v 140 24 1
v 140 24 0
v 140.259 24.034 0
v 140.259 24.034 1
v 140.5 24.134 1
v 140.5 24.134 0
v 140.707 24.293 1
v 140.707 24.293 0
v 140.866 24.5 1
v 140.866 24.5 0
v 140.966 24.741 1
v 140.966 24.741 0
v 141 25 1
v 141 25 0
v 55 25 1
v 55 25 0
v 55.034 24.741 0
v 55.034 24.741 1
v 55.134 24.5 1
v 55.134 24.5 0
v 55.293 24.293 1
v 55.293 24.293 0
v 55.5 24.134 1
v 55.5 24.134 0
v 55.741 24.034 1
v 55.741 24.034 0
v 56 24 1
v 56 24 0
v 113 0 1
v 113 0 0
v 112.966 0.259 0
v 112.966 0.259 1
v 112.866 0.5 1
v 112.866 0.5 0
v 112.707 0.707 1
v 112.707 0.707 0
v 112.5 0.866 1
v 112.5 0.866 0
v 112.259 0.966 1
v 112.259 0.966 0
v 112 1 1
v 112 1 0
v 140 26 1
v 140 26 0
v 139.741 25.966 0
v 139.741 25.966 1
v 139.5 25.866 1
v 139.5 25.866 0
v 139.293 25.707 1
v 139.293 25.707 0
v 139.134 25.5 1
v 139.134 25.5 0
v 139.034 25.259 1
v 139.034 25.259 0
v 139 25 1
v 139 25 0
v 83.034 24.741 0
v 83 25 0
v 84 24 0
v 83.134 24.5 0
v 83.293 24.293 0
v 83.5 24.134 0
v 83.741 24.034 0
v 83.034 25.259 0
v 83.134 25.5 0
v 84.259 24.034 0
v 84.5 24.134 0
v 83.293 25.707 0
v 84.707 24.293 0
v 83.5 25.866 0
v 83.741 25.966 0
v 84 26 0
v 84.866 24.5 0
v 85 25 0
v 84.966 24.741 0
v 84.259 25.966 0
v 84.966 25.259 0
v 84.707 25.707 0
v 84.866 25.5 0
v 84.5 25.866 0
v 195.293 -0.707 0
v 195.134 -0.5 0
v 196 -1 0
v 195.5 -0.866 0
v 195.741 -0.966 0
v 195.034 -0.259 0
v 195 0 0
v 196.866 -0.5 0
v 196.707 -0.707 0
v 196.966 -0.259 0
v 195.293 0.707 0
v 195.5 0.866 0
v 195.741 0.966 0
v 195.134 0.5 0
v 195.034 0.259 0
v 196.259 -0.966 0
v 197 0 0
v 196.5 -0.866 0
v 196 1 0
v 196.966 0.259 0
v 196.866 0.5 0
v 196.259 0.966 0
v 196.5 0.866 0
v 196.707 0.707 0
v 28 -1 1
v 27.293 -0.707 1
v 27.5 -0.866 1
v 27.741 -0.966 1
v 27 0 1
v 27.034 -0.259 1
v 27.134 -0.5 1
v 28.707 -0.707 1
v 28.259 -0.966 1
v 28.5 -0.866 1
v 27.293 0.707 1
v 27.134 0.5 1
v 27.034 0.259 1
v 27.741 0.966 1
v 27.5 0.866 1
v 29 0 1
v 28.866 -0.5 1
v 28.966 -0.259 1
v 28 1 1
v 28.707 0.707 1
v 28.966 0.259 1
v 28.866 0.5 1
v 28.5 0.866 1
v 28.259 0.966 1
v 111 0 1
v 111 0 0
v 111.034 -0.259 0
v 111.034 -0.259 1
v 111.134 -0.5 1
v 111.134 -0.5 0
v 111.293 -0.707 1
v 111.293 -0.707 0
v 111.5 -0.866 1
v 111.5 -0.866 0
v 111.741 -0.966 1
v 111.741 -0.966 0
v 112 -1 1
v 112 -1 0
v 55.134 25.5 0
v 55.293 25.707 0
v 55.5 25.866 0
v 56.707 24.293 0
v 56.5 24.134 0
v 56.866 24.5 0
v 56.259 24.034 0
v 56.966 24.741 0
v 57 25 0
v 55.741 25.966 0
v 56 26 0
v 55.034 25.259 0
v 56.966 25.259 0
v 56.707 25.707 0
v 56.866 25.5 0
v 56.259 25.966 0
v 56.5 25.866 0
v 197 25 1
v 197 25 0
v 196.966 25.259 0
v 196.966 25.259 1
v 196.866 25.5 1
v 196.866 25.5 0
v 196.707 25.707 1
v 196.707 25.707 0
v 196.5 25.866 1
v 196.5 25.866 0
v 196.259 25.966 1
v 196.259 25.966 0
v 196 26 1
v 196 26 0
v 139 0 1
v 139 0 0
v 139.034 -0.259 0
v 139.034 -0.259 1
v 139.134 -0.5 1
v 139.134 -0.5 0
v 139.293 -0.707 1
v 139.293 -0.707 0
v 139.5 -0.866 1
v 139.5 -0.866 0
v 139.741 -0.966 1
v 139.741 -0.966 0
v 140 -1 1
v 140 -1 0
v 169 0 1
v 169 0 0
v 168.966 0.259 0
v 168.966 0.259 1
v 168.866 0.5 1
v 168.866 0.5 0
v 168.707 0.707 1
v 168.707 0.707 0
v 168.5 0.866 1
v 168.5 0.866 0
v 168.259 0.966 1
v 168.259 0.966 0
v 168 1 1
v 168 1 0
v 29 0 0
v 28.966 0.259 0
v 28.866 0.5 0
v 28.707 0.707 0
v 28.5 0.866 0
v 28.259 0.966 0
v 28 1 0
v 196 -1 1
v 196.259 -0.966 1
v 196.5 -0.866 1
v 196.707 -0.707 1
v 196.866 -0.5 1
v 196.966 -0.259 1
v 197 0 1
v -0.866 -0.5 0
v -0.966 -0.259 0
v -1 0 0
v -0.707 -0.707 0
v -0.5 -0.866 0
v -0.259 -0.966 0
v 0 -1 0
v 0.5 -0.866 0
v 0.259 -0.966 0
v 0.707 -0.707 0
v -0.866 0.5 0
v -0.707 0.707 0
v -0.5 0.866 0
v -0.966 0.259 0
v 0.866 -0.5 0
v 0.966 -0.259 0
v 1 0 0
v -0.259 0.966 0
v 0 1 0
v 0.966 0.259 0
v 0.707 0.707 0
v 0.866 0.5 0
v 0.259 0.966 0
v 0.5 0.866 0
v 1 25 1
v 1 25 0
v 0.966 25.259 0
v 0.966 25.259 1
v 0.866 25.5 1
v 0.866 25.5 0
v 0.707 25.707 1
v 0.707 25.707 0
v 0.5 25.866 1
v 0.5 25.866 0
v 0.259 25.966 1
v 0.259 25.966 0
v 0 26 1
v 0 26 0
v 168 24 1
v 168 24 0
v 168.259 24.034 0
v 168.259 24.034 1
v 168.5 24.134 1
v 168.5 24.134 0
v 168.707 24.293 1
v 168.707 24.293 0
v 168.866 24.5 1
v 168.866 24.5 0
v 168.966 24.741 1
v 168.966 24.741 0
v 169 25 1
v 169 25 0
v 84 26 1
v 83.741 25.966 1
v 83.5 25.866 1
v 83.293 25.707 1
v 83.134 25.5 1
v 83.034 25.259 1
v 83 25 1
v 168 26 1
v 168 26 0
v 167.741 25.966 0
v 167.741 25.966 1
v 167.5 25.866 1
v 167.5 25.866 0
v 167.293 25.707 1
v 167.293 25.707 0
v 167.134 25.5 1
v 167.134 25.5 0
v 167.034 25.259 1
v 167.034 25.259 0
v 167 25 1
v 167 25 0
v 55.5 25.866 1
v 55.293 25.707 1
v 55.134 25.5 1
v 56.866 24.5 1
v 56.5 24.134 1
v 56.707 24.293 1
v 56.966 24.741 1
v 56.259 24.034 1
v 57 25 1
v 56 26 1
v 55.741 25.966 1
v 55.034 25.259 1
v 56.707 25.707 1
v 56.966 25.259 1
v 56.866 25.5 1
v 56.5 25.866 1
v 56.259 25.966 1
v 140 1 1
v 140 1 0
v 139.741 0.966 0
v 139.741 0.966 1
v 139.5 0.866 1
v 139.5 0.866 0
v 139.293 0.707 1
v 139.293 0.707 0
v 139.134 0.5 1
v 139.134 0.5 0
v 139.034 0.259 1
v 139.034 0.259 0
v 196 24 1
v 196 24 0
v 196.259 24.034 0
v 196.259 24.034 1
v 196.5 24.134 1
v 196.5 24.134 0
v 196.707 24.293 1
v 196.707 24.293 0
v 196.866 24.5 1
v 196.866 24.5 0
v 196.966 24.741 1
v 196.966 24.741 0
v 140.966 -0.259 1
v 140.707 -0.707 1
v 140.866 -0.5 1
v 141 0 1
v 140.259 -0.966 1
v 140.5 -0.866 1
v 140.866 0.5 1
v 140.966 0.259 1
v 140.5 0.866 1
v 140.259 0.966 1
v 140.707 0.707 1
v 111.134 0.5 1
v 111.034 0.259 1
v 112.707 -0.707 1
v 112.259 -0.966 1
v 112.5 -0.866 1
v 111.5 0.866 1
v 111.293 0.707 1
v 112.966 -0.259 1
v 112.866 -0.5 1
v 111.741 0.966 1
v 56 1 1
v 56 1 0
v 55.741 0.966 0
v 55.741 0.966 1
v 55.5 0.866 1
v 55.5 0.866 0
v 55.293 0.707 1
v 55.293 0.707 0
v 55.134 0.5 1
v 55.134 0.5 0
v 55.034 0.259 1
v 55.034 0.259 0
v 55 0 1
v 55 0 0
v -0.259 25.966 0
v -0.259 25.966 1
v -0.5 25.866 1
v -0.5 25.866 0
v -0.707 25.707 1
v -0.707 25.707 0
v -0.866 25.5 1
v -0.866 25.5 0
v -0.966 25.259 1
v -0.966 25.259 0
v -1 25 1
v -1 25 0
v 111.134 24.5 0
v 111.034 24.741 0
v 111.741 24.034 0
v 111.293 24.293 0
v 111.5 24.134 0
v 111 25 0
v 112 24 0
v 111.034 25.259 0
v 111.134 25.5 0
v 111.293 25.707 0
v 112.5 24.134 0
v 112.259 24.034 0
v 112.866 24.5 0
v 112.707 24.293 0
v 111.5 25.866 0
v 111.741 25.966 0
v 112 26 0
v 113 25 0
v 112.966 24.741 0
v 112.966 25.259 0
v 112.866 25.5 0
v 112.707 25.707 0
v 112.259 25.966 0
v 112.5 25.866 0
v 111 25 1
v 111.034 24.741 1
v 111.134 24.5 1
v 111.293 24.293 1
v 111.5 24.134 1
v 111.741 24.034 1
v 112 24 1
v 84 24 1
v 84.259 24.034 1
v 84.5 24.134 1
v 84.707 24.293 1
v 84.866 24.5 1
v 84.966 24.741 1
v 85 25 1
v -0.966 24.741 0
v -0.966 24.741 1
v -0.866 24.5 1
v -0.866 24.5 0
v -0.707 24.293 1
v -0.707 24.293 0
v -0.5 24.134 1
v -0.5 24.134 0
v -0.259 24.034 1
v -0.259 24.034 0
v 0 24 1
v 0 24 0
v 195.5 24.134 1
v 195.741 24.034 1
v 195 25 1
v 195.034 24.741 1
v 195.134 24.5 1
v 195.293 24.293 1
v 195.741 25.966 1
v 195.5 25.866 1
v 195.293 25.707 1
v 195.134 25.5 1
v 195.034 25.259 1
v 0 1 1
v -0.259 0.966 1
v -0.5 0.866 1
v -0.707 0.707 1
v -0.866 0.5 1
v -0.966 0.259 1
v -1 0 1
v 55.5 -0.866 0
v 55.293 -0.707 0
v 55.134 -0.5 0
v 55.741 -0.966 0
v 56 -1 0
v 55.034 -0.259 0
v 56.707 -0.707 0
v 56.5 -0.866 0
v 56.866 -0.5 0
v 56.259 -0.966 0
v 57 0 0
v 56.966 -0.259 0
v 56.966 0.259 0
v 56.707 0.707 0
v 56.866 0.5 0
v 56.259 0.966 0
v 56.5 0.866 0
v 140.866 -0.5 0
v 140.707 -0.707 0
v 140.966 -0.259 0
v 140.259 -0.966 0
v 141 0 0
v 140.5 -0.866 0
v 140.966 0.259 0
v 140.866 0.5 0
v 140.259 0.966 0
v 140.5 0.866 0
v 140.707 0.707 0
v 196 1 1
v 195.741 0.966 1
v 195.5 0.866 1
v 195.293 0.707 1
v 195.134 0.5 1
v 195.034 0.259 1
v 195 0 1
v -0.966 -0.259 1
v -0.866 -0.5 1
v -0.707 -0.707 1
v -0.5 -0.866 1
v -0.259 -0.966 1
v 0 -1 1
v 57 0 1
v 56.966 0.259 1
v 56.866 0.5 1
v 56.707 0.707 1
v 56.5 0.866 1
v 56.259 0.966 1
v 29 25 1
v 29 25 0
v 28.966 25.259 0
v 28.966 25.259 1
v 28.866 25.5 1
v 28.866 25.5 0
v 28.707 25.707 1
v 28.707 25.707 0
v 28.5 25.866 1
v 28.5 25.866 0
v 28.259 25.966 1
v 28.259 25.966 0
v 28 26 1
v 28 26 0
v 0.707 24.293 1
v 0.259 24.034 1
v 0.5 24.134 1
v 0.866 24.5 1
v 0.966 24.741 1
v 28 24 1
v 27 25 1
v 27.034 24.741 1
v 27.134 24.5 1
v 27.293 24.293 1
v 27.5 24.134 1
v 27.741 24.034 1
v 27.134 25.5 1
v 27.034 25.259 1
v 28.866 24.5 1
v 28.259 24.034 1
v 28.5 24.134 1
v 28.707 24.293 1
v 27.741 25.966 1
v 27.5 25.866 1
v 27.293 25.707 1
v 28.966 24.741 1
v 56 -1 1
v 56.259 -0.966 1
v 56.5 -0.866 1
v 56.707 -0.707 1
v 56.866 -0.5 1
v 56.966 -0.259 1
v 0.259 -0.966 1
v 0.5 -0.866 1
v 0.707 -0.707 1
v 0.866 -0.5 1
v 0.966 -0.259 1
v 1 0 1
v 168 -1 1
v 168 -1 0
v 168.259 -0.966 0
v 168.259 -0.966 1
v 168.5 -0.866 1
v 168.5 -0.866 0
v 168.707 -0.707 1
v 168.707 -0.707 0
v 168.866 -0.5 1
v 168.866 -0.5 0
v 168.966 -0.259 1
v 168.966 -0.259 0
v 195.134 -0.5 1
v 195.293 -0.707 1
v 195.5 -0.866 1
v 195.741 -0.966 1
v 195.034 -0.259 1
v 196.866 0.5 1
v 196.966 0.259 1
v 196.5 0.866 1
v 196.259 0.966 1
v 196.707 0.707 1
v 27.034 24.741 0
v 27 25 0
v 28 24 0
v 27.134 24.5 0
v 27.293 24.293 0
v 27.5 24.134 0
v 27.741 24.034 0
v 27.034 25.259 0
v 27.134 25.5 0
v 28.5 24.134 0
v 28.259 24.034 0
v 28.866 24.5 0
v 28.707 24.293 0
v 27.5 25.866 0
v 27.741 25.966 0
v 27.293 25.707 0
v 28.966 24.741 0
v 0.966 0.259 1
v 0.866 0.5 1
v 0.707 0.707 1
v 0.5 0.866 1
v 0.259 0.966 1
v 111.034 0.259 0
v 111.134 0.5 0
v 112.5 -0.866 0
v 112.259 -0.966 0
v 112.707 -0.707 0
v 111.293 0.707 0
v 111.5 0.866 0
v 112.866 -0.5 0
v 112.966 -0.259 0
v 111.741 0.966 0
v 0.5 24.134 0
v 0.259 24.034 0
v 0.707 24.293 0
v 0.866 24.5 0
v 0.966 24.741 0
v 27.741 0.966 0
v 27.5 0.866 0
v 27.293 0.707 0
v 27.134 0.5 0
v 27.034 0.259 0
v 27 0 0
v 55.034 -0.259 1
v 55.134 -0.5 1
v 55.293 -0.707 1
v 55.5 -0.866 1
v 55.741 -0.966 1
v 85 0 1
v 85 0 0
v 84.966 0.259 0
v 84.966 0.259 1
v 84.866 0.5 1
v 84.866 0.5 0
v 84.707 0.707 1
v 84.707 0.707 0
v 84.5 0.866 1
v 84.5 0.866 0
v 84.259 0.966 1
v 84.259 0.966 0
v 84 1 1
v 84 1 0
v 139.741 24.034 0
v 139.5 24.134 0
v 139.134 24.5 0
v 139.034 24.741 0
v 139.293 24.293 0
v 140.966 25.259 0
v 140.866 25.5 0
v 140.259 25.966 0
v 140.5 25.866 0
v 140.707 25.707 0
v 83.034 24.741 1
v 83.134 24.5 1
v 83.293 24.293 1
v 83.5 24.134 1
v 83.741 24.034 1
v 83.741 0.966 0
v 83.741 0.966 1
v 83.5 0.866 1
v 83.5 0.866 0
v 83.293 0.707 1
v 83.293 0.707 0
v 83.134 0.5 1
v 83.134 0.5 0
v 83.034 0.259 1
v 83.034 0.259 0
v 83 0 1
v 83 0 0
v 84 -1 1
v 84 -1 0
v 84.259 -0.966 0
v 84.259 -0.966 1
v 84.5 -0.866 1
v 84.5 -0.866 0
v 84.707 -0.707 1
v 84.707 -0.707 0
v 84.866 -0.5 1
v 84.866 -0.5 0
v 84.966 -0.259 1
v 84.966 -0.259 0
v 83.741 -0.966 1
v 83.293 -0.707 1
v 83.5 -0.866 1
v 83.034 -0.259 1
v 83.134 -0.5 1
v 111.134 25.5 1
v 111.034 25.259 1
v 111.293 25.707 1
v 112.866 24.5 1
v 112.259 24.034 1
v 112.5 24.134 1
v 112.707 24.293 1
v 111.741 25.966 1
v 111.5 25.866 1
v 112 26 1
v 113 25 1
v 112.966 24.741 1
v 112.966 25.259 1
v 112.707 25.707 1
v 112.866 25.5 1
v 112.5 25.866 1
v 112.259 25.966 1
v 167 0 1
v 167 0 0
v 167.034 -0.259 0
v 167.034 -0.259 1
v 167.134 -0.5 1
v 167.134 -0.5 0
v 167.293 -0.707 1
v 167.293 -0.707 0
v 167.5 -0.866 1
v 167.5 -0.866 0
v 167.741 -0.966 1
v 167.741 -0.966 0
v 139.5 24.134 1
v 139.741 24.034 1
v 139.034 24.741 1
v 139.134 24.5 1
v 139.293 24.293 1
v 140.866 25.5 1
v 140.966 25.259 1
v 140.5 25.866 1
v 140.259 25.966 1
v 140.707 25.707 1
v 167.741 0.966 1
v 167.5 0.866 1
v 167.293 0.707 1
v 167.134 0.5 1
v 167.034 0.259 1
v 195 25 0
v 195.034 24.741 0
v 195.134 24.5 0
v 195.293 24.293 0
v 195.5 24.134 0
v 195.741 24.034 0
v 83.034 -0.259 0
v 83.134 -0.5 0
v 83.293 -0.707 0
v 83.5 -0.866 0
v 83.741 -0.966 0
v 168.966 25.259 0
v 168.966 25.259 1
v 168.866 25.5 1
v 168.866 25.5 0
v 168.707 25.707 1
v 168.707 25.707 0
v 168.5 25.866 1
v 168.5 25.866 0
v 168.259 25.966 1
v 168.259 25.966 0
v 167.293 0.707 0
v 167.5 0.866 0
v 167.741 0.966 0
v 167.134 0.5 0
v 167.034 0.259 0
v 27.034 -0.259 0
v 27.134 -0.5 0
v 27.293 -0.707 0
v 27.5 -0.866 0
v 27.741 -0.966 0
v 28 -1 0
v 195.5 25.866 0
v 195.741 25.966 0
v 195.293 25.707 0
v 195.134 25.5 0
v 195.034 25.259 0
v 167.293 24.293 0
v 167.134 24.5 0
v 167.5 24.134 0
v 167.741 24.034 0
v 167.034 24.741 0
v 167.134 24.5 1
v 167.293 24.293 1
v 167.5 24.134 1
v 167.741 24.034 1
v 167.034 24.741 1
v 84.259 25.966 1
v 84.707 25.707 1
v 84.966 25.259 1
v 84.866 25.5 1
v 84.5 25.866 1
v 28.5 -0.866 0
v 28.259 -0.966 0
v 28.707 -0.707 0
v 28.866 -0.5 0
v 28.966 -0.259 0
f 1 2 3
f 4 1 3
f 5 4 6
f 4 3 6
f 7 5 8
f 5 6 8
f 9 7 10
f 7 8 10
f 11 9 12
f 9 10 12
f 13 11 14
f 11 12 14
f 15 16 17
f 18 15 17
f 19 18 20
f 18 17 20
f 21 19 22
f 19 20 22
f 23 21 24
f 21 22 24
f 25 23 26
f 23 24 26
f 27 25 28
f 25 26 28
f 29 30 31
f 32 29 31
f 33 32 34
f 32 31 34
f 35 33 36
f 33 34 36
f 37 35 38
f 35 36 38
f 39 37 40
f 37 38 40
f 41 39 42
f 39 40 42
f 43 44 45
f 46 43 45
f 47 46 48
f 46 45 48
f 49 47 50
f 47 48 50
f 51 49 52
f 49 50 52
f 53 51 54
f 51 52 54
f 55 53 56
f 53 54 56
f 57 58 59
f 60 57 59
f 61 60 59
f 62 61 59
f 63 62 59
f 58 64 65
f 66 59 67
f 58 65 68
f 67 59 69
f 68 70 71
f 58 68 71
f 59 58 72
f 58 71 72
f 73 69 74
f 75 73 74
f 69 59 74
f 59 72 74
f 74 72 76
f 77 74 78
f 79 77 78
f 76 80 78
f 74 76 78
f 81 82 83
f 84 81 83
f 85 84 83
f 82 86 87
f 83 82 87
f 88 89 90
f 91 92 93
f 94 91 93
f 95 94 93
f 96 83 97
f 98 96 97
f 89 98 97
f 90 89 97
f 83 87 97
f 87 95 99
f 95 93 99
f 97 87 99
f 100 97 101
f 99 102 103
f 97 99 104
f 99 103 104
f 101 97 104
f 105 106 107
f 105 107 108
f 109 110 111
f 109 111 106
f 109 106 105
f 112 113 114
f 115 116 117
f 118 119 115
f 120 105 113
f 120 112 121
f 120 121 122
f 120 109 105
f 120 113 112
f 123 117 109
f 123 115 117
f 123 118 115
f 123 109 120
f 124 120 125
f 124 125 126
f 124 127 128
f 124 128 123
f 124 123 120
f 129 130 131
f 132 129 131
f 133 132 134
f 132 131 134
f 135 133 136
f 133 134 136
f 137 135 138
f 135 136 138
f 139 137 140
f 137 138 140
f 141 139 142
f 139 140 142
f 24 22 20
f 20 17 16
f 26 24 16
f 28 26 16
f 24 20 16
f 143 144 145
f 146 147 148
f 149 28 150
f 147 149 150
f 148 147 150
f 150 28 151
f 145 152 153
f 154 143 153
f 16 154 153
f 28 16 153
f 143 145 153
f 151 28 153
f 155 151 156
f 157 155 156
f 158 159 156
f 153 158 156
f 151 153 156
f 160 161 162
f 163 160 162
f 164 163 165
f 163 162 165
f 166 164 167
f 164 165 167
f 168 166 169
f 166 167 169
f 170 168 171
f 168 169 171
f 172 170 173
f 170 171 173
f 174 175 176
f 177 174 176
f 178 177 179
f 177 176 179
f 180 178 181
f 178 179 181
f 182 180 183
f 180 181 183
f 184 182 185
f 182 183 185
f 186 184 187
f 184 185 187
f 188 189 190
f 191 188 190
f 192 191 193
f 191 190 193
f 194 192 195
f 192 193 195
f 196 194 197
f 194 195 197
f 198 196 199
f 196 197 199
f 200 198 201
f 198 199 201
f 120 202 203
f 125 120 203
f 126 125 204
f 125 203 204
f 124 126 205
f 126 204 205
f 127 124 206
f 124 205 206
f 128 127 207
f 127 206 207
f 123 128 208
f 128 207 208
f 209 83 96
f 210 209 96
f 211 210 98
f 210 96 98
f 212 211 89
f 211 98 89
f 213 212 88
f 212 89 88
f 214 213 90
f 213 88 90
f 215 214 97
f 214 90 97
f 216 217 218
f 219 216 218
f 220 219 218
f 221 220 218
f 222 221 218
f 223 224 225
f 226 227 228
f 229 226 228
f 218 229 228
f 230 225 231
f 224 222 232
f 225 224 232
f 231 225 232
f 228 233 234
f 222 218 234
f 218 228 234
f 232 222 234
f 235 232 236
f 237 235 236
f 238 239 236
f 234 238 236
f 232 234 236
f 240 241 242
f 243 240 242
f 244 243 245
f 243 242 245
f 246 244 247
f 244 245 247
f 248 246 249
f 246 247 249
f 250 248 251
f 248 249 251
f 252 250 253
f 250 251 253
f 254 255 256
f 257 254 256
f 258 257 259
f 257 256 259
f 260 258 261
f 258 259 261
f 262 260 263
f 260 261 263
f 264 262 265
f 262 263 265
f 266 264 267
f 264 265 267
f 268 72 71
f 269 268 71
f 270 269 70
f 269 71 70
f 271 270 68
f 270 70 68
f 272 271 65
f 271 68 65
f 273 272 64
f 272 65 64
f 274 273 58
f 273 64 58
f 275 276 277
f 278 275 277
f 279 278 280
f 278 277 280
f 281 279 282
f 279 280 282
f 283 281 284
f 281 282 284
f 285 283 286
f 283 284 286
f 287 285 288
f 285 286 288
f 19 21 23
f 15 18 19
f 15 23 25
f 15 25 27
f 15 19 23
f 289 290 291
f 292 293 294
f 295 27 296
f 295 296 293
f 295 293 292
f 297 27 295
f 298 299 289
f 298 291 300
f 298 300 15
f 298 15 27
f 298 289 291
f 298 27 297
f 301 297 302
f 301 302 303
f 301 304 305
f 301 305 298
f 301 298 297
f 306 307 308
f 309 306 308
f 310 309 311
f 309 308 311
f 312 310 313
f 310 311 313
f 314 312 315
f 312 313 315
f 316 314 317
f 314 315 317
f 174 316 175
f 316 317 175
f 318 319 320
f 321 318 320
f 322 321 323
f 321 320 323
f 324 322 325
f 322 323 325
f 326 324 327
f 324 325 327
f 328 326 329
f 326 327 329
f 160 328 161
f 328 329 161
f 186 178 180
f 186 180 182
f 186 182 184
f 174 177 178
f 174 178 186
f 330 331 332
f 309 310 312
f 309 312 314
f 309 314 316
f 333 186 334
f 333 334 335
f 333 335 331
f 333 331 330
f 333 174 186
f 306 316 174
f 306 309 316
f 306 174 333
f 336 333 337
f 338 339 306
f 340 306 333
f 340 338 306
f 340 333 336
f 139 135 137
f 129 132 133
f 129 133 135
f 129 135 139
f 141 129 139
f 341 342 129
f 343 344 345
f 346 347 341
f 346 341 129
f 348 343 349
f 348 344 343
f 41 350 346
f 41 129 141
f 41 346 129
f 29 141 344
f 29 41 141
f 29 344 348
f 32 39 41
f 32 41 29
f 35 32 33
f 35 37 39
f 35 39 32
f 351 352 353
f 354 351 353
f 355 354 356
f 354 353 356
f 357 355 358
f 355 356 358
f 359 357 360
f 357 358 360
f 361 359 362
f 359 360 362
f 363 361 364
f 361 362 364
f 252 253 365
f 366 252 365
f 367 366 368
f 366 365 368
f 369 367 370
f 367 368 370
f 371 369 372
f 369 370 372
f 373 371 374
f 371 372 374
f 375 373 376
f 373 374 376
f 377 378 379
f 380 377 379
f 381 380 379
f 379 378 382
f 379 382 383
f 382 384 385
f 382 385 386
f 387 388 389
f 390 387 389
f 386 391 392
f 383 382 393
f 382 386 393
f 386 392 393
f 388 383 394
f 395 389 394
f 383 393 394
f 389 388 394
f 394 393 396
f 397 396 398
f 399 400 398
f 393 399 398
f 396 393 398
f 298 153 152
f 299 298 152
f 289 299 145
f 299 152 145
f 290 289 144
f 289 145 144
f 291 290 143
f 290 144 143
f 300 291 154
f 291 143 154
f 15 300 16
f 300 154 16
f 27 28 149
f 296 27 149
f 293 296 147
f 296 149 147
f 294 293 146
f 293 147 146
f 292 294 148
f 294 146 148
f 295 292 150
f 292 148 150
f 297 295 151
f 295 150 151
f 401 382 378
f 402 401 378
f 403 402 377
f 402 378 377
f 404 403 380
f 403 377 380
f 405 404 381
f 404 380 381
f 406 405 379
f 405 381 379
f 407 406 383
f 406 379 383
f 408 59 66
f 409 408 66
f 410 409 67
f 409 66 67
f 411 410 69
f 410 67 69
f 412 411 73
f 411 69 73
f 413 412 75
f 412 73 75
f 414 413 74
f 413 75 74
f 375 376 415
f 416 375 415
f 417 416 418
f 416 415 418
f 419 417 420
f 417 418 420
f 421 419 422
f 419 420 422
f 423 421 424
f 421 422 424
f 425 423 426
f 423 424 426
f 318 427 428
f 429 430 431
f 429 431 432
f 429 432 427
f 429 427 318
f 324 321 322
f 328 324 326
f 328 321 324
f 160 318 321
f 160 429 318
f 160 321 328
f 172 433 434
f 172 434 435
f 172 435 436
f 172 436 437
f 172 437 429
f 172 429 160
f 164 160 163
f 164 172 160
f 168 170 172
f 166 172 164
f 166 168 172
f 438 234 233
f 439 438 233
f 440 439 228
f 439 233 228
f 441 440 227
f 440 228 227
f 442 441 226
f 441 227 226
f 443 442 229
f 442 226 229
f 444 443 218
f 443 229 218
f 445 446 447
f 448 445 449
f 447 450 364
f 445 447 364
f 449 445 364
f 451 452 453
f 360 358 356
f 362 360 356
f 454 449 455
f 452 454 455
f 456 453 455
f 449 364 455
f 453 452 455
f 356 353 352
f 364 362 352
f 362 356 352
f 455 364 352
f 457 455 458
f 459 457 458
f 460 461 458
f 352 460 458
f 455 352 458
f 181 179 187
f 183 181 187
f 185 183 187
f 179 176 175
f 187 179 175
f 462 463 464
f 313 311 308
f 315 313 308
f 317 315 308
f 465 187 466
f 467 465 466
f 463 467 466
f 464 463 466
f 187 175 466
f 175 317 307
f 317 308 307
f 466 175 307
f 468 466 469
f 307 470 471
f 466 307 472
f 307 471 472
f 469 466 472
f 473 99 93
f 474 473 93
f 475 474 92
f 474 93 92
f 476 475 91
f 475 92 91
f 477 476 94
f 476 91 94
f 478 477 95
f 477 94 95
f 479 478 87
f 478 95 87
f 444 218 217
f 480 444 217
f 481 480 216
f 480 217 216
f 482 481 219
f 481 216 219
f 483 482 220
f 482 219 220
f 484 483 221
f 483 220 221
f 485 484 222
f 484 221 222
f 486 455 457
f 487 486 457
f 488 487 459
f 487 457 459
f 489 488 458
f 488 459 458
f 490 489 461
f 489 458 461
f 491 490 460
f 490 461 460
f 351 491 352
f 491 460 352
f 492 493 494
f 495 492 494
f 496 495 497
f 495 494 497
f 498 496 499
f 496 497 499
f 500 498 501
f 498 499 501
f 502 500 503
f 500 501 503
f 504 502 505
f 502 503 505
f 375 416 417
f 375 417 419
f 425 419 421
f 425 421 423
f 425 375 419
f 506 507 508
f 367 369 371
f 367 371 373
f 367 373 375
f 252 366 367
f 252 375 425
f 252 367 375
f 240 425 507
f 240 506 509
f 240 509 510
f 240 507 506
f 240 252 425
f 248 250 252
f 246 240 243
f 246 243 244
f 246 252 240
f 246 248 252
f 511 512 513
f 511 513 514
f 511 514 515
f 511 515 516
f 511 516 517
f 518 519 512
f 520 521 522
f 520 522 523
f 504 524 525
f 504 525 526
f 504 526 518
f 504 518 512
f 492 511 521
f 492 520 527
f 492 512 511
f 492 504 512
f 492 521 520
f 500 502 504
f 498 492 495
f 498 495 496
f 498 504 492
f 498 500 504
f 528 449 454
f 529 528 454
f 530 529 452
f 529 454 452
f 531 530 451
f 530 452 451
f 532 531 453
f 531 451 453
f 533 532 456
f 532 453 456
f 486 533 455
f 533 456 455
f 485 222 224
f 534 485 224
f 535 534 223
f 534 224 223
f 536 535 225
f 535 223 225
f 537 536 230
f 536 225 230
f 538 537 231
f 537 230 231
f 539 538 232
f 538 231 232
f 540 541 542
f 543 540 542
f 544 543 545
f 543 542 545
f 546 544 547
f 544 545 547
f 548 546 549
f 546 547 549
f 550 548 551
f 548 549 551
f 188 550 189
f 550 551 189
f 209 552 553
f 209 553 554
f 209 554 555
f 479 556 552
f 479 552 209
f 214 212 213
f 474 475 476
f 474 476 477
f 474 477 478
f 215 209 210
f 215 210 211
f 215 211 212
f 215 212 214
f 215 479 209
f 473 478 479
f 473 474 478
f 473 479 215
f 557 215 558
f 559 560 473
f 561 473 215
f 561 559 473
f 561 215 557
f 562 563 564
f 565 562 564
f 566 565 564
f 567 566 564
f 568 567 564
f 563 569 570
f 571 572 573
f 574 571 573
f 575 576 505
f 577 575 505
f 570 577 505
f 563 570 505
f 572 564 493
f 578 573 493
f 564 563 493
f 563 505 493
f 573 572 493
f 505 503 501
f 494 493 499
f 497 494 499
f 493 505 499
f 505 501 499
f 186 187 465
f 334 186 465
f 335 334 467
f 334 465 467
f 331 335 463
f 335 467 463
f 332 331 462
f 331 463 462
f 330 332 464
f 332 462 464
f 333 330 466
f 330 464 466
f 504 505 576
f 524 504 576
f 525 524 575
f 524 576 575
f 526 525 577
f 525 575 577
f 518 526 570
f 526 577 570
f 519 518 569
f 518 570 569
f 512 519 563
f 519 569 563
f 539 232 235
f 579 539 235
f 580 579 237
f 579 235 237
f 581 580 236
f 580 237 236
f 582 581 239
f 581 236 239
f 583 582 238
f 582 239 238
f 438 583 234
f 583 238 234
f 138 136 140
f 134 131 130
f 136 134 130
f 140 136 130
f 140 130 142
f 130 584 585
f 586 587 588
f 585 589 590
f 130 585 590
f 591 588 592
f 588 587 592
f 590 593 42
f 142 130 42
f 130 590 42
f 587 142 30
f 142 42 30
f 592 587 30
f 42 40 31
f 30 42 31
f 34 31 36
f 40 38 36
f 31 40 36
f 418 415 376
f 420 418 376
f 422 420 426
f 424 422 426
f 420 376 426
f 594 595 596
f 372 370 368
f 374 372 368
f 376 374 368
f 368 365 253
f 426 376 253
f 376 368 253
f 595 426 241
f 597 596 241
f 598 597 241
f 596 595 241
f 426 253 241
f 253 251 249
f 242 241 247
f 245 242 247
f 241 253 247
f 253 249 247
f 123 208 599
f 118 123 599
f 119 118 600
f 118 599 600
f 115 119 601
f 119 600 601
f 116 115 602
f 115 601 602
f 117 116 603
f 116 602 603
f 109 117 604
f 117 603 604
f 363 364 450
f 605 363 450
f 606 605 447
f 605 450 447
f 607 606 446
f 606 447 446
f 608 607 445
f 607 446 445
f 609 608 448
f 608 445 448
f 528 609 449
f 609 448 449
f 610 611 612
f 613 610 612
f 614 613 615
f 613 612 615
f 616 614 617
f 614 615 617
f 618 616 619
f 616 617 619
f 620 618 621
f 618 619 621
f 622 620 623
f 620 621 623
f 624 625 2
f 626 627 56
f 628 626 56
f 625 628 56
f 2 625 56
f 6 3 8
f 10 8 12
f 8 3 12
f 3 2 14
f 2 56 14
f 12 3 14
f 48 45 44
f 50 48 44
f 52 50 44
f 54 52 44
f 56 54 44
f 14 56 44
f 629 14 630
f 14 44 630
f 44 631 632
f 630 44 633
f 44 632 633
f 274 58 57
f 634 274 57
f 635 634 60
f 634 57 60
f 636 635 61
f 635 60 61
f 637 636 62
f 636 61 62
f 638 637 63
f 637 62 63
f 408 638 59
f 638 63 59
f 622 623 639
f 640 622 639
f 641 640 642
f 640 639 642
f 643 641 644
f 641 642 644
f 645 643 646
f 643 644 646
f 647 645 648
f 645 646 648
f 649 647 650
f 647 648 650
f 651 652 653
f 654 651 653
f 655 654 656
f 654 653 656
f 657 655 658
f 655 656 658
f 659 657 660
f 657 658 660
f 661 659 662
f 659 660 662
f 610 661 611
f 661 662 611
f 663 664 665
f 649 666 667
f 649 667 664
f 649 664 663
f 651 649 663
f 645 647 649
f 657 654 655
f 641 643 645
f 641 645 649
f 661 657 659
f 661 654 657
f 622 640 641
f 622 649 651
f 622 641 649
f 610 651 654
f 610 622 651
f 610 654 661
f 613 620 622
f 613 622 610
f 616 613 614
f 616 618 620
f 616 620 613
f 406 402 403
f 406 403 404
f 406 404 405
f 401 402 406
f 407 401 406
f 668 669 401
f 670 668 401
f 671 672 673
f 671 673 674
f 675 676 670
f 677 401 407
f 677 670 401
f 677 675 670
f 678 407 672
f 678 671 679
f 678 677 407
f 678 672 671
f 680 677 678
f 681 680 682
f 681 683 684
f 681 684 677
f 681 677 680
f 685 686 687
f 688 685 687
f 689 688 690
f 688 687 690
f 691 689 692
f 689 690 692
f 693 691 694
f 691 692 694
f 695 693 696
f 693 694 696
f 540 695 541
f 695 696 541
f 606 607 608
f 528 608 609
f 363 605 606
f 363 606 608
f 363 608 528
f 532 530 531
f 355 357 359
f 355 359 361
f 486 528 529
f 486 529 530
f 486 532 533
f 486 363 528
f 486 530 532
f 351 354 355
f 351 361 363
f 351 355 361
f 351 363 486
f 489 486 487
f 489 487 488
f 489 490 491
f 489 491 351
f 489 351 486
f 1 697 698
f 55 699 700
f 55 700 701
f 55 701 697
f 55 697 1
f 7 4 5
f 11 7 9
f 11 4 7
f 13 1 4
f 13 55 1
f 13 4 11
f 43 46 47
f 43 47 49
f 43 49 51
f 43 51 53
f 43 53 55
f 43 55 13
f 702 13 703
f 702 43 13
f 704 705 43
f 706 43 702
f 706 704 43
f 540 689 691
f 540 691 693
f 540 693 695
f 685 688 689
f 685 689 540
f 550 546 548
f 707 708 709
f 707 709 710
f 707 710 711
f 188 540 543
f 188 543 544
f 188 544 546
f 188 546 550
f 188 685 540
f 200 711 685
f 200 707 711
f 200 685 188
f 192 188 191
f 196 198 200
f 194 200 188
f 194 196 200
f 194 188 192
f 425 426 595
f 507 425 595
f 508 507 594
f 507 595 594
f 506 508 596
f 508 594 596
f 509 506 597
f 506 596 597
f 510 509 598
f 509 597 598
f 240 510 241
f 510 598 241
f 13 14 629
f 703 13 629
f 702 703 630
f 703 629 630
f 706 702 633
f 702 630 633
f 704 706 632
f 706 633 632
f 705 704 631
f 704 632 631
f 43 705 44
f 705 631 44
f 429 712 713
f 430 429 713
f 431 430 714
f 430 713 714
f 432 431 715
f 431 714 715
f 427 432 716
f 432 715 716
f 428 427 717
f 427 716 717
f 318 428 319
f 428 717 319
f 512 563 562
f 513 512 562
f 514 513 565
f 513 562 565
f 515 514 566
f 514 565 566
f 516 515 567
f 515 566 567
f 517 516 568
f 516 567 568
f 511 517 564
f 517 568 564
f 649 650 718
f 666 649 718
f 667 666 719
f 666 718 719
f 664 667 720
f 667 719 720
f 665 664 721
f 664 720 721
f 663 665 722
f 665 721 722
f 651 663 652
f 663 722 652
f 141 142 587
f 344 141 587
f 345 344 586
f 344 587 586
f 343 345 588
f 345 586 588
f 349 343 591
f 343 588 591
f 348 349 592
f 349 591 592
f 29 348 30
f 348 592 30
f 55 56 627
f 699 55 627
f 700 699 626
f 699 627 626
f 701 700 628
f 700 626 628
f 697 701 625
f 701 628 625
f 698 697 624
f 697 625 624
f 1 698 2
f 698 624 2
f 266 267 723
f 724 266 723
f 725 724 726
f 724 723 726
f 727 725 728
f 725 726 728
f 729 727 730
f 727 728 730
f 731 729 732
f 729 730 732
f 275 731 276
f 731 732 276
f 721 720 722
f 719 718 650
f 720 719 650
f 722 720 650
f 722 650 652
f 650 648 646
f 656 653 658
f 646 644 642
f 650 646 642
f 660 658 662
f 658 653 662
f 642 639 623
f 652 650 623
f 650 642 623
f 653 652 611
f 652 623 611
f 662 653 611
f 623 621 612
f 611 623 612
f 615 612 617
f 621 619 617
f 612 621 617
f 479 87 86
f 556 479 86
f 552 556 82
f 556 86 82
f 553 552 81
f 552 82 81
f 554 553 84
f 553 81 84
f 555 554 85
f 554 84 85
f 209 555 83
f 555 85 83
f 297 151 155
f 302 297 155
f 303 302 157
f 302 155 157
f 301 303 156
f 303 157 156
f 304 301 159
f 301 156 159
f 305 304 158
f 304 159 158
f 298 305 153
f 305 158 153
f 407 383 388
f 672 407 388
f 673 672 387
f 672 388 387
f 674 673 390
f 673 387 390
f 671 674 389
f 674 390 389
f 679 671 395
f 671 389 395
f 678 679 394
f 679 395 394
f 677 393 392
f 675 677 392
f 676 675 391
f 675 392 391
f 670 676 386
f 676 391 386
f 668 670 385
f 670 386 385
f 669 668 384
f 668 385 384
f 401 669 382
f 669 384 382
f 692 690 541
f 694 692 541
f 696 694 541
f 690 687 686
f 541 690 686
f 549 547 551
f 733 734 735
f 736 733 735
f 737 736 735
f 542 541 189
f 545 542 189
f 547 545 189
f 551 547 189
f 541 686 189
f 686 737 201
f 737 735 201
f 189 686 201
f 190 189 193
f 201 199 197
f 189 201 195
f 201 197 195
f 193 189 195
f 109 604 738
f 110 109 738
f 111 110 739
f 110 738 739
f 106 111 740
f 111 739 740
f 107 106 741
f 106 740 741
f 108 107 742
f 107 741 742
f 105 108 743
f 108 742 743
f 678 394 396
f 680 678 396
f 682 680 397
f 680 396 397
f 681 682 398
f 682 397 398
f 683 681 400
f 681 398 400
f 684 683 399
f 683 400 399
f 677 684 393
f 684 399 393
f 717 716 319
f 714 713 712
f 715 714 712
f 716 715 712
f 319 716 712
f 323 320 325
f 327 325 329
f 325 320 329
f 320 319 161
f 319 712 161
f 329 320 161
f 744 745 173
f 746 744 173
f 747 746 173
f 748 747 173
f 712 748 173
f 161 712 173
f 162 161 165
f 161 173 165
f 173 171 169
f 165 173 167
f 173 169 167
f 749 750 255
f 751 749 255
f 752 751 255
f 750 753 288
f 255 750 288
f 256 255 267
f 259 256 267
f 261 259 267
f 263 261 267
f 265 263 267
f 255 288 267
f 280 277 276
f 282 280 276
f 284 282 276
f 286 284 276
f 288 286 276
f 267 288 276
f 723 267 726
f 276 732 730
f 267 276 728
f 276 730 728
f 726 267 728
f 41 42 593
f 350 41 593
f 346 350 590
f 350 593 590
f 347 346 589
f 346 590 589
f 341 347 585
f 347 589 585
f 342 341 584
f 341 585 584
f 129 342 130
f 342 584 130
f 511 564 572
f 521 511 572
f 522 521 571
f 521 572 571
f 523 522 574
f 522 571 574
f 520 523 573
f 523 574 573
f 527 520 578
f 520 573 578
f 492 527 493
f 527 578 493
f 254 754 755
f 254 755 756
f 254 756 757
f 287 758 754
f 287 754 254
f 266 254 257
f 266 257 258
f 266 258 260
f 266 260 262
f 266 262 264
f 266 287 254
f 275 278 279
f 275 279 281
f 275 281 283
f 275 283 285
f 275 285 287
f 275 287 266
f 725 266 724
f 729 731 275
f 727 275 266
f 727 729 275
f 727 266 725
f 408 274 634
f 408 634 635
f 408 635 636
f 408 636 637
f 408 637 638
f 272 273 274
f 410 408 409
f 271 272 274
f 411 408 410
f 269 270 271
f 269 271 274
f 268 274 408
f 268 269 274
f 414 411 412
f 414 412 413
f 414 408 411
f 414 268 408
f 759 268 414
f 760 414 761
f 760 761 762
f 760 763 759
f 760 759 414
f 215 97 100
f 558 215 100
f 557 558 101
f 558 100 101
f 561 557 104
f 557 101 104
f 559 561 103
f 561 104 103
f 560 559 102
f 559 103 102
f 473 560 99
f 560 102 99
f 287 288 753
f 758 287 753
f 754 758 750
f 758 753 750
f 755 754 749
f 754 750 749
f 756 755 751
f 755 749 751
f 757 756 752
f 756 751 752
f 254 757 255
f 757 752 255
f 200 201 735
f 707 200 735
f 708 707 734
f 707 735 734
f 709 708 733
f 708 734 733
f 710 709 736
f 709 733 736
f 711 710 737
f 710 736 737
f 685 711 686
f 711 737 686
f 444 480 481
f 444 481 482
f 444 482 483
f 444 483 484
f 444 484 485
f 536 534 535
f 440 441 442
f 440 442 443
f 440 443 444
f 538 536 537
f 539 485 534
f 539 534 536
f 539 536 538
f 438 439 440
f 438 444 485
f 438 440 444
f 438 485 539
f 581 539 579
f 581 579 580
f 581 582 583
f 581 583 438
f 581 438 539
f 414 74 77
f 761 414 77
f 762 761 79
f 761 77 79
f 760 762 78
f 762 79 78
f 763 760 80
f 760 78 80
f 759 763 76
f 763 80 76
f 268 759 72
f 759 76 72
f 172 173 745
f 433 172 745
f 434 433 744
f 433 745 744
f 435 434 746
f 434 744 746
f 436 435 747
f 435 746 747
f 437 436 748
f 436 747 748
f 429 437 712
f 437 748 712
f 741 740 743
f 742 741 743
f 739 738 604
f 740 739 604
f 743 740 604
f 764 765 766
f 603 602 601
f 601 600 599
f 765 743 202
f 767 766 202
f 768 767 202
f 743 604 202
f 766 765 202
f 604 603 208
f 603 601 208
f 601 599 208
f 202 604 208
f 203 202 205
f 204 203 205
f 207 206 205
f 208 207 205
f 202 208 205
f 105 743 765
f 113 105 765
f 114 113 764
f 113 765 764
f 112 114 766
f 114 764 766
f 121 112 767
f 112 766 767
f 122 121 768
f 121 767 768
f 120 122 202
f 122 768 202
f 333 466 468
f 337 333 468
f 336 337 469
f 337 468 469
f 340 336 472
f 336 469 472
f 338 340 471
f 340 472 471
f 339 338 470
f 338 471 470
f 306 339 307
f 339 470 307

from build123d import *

# Parameters (mm, degrees)
F1_DEPTH = 1


with BuildPart() as f1:
    # F0 (on Top) → F1 (new body)
    with BuildSketch(Plane.XY):
        with BuildLine():
            ThreePointArc((196, 24), (196.7071067812, 24.2928932188), (197, 25))
            Line((197, 25), (196, 25))
            Line((196, 25), (196, 24))
        make_face()
        with BuildLine():
            Line((196, 25), (196, 26))
            ThreePointArc((196, 26), (195.2928932188, 25.7071067812), (195, 25))
            Line((195, 25), (196, 25))
        make_face()
        with BuildLine():
            ThreePointArc((195, 25), (195.2928932188, 24.2928932188), (196, 24))
            Line((196, 24), (196, 25))
            Line((196, 25), (195, 25))
        make_face()
        with BuildLine():
            Line((196, 25), (197, 25))
            ThreePointArc((197, 25), (196.7071067812, 25.7071067812), (196, 26))
            Line((196, 26), (196, 25))
        make_face()
    extrude(amount=F1_DEPTH)


with BuildPart() as f1b:
    # F0 (on Top) → F1, piece 2 (new body)
    with BuildSketch(Plane.XY):
        with BuildLine():
            Line((168, 25), (169, 25))
            ThreePointArc((169, 25), (168.7071067812, 25.7071067812), (168, 26))
            Line((168, 26), (168, 25))
        make_face()
        with BuildLine():
            Line((168, 25), (168, 26))
            ThreePointArc((168, 26), (167.2928932188, 25.7071067812), (167, 25))
            Line((167, 25), (168, 25))
        make_face()
        with BuildLine():
            ThreePointArc((167, 25), (167.2928932188, 24.2928932188), (168, 24))
            Line((168, 24), (168, 25))
            Line((168, 25), (167, 25))
        make_face()
        with BuildLine():
            ThreePointArc((168, 24), (168.7071067812, 24.2928932188), (169, 25))
            Line((169, 25), (168, 25))
            Line((168, 25), (168, 24))
        make_face()
    extrude(amount=F1_DEPTH)


with BuildPart() as f1c:
    # F0 (on Top) → F1, piece 3 (new body)
    with BuildSketch(Plane.XY):
        with BuildLine():
            Line((196, 0), (197, 0))
            ThreePointArc((197, 0), (196.7071067812, 0.7071067812), (196, 1))
            Line((196, 1), (196, 0))
        make_face()
        with BuildLine():
            Line((196, 0), (196, 1))
            ThreePointArc((196, 1), (195.2928932188, 0.7071067812), (195, 0))
            Line((195, 0), (196, 0))
        make_face()
        with BuildLine():
            ThreePointArc((195, 0), (195.2928932188, -0.7071067812), (196, -1))
            Line((196, -1), (196, 0))
            Line((196, 0), (195, 0))
        make_face()
        with BuildLine():
            ThreePointArc((196, -1), (196.7071067812, -0.7071067812), (197, 0))
            Line((197, 0), (196, 0))
            Line((196, 0), (196, -1))
        make_face()
    extrude(amount=F1_DEPTH)


with BuildPart() as f1d:
    # F0 (on Top) → F1, piece 4 (new body)
    with BuildSketch(Plane.XY):
        with BuildLine():
            Line((0, 25), (1, 25))
            ThreePointArc((1, 25), (0.7071067812, 25.7071067812), (0, 26))
            Line((0, 26), (0, 25))
        make_face()
        with BuildLine():
            Line((0, 25), (0, 26))
            ThreePointArc((0, 26), (-0.7071067812, 25.7071067812), (-1, 25))
            Line((-1, 25), (0, 25))
        make_face()
        with BuildLine():
            ThreePointArc((-1, 25), (-0.7071067812, 24.2928932188), (0, 24))
            Line((0, 24), (0, 25))
            Line((0, 25), (-1, 25))
        make_face()
        with BuildLine():
            ThreePointArc((0, 24), (0.7071067812, 24.2928932188), (1, 25))
            Line((1, 25), (0, 25))
            Line((0, 25), (0, 24))
        make_face()
    extrude(amount=F1_DEPTH)


with BuildPart() as f1e:
    # F0 (on Top) → F1, piece 5 (new body)
    with BuildSketch(Plane.XY):
        with BuildLine():
            Line((28, 0), (29, 0))
            ThreePointArc((29, 0), (28.7071067812, 0.7071067812), (28, 1))
            Line((28, 1), (28, 0))
        make_face()
        with BuildLine():
            Line((28, 0), (28, 1))
            ThreePointArc((28, 1), (27.2928932188, 0.7071067812), (27, 0))
            Line((27, 0), (28, 0))
        make_face()
        with BuildLine():
            ThreePointArc((27, 0), (27.2928932188, -0.7071067812), (28, -1))
            Line((28, -1), (28, 0))
            Line((28, 0), (27, 0))
        make_face()
        with BuildLine():
            ThreePointArc((28, -1), (28.7071067812, -0.7071067812), (29, 0))
            Line((29, 0), (28, 0))
            Line((28, 0), (28, -1))
        make_face()
    extrude(amount=F1_DEPTH)


with BuildPart() as f1f:
    # F0 (on Top) → F1, piece 6 (new body)
    with BuildSketch(Plane.XY):
        with BuildLine():
            ThreePointArc((28, 24), (28.7071067812, 24.2928932188), (29, 25))
            Line((29, 25), (28, 25))
            Line((28, 25), (28, 24))
        make_face()
        with BuildLine():
            Line((28, 25), (28, 26))
            ThreePointArc((28, 26), (27.2928932188, 25.7071067812), (27, 25))
            Line((27, 25), (28, 25))
        make_face()
        with BuildLine():
            ThreePointArc((27, 25), (27.2928932188, 24.2928932188), (28, 24))
            Line((28, 24), (28, 25))
            Line((28, 25), (27, 25))
        make_face()
        with BuildLine():
            Line((28, 25), (29, 25))
            ThreePointArc((29, 25), (28.7071067812, 25.7071067812), (28, 26))
            Line((28, 26), (28, 25))
        make_face()
    extrude(amount=F1_DEPTH)


with BuildPart() as f1g:
    # F0 (on Top) → F1, piece 7 (new body)
    with BuildSketch(Plane.XY):
        with BuildLine():
            Line((56, 0), (57, 0))
            ThreePointArc((57, 0), (56.7071067812, 0.7071067812), (56, 1))
            Line((56, 1), (56, 0))
        make_face()
        with BuildLine():
            Line((56, 0), (56, 1))
            ThreePointArc((56, 1), (55.2928932188, 0.7071067812), (55, 0))
            Line((55, 0), (56, 0))
        make_face()
        with BuildLine():
            ThreePointArc((55, 0), (55.2928932188, -0.7071067812), (56, -1))
            Line((56, -1), (56, 0))
            Line((56, 0), (55, 0))
        make_face()
        with BuildLine():
            ThreePointArc((56, -1), (56.7071067812, -0.7071067812), (57, 0))
            Line((57, 0), (56, 0))
            Line((56, 0), (56, -1))
        make_face()
    extrude(amount=F1_DEPTH)


with BuildPart() as f1h:
    # F0 (on Top) → F1, piece 8 (new body)
    with BuildSketch(Plane.XY):
        with BuildLine():
            Line((56, 25), (57, 25))
            ThreePointArc((57, 25), (56.7071067812, 25.7071067812), (56, 26))
            Line((56, 26), (56, 25))
        make_face()
        with BuildLine():
            Line((56, 25), (56, 26))
            ThreePointArc((56, 26), (55.2928932188, 25.7071067812), (55, 25))
            Line((55, 25), (56, 25))
        make_face()
        with BuildLine():
            ThreePointArc((55, 25), (55.2928932188, 24.2928932188), (56, 24))
            Line((56, 24), (56, 25))
            Line((56, 25), (55, 25))
        make_face()
        with BuildLine():
            ThreePointArc((56, 24), (56.7071067812, 24.2928932188), (57, 25))
            Line((57, 25), (56, 25))
            Line((56, 25), (56, 24))
        make_face()
    extrude(amount=F1_DEPTH)


with BuildPart() as f1i:
    # F0 (on Top) → F1, piece 9 (new body)
    with BuildSketch(Plane.XY):
        with BuildLine():
            Line((84, 0), (85, 0))
            ThreePointArc((85, 0), (84.7071067812, 0.7071067812), (84, 1))
            Line((84, 1), (84, 0))
        make_face()
        with BuildLine():
            Line((84, 0), (84, 1))
            ThreePointArc((84, 1), (83.2928932188, 0.7071067812), (83, 0))
            Line((83, 0), (84, 0))
        make_face()
        with BuildLine():
            ThreePointArc((83, 0), (83.2928932188, -0.7071067812), (84, -1))
            Line((84, -1), (84, 0))
            Line((84, 0), (83, 0))
        make_face()
        with BuildLine():
            ThreePointArc((84, -1), (84.7071067812, -0.7071067812), (85, 0))
            Line((85, 0), (84, 0))
            Line((84, 0), (84, -1))
        make_face()
    extrude(amount=F1_DEPTH)


with BuildPart() as f1j:
    # F0 (on Top) → F1, piece 10 (new body)
    with BuildSketch(Plane.XY):
        with BuildLine():
            ThreePointArc((84, 24), (84.7071067812, 24.2928932188), (85, 25))
            Line((85, 25), (84, 25))
            Line((84, 25), (84, 24))
        make_face()
        with BuildLine():
            ThreePointArc((83, 25), (83.2928932188, 24.2928932188), (84, 24))
            Line((84, 24), (84, 25))
            Line((84, 25), (83, 25))
        make_face()
        with BuildLine():
            Line((84, 25), (85, 25))
            ThreePointArc((85, 25), (84.7071067812, 25.7071067812), (84, 26))
            Line((84, 26), (84, 25))
        make_face()
        with BuildLine():
            Line((84, 25), (84, 26))
            ThreePointArc((84, 26), (83.2928932188, 25.7071067812), (83, 25))
            Line((83, 25), (84, 25))
        make_face()
    extrude(amount=F1_DEPTH)


with BuildPart() as f1k:
    # F0 (on Top) → F1, piece 11 (new body)
    with BuildSketch(Plane.XY):
        with BuildLine():
            Line((112, 0), (113, 0))
            ThreePointArc((113, 0), (112.7071067812, 0.7071067812), (112, 1))
            Line((112, 1), (112, 0))
        make_face()
        with BuildLine():
            Line((112, 0), (112, 1))
            ThreePointArc((112, 1), (111.2928932188, 0.7071067812), (111, 0))
            Line((111, 0), (112, 0))
        make_face()
        with BuildLine():
            ThreePointArc((111, 0), (111.2928932188, -0.7071067812), (112, -1))
            Line((112, -1), (112, 0))
            Line((112, 0), (111, 0))
        make_face()
        with BuildLine():
            ThreePointArc((112, -1), (112.7071067812, -0.7071067812), (113, 0))
            Line((113, 0), (112, 0))
            Line((112, 0), (112, -1))
        make_face()
    extrude(amount=F1_DEPTH)


with BuildPart() as f1l:
    # F0 (on Top) → F1, piece 12 (new body)
    with BuildSketch(Plane.XY):
        with BuildLine():
            Line((112, 25), (113, 25))
            ThreePointArc((113, 25), (112.7071067812, 25.7071067812), (112, 26))
            Line((112, 26), (112, 25))
        make_face()
        with BuildLine():
            Line((112, 25), (112, 26))
            ThreePointArc((112, 26), (111.2928932188, 25.7071067812), (111, 25))
            Line((111, 25), (112, 25))
        make_face()
        with BuildLine():
            ThreePointArc((111, 25), (111.2928932188, 24.2928932188), (112, 24))
            Line((112, 24), (112, 25))
            Line((112, 25), (111, 25))
        make_face()
        with BuildLine():
            ThreePointArc((112, 24), (112.7071067812, 24.2928932188), (113, 25))
            Line((113, 25), (112, 25))
            Line((112, 25), (112, 24))
        make_face()
    extrude(amount=F1_DEPTH)


with BuildPart() as f1m:
    # F0 (on Top) → F1, piece 13 (new body)
    with BuildSketch(Plane.XY):
        with BuildLine():
            Line((140, 0), (141, 0))
            ThreePointArc((141, 0), (140.7071067812, 0.7071067812), (140, 1))
            Line((140, 1), (140, 0))
        make_face()
        with BuildLine():
            Line((140, 0), (140, 1))
            ThreePointArc((140, 1), (139.2928932188, 0.7071067812), (139, 0))
            Line((139, 0), (140, 0))
        make_face()
        with BuildLine():
            ThreePointArc((139, 0), (139.2928932188, -0.7071067812), (140, -1))
            Line((140, -1), (140, 0))
            Line((140, 0), (139, 0))
        make_face()
        with BuildLine():
            ThreePointArc((140, -1), (140.7071067812, -0.7071067812), (141, 0))
            Line((141, 0), (140, 0))
            Line((140, 0), (140, -1))
        make_face()
    extrude(amount=F1_DEPTH)


with BuildPart() as f1n:
    # F0 (on Top) → F1, piece 14 (new body)
    with BuildSketch(Plane.XY):
        with BuildLine():
            ThreePointArc((140, 24), (140.7071067812, 24.2928932188), (141, 25))
            Line((141, 25), (140, 25))
            Line((140, 25), (140, 24))
        make_face()
        with BuildLine():
            Line((140, 25), (140, 26))
            ThreePointArc((140, 26), (139.2928932188, 25.7071067812), (139, 25))
            Line((139, 25), (140, 25))
        make_face()
        with BuildLine():
            ThreePointArc((139, 25), (139.2928932188, 24.2928932188), (140, 24))
            Line((140, 24), (140, 25))
            Line((140, 25), (139, 25))
        make_face()
        with BuildLine():
            Line((140, 25), (141, 25))
            ThreePointArc((141, 25), (140.7071067812, 25.7071067812), (140, 26))
            Line((140, 26), (140, 25))
        make_face()
    extrude(amount=F1_DEPTH)


with BuildPart() as f1o:
    # F0 (on Top) → F1, piece 15 (new body)
    with BuildSketch(Plane.XY):
        with BuildLine():
            Line((168, 0), (169, 0))
            ThreePointArc((169, 0), (168.7071067812, 0.7071067812), (168, 1))
            Line((168, 1), (168, 0))
        make_face()
        with BuildLine():
            Line((168, 0), (168, 1))
            ThreePointArc((168, 1), (167.2928932188, 0.7071067812), (167, 0))
            Line((167, 0), (168, 0))
        make_face()
        with BuildLine():
            ThreePointArc((167, 0), (167.2928932188, -0.7071067812), (168, -1))
            Line((168, -1), (168, 0))
            Line((168, 0), (167, 0))
        make_face()
        with BuildLine():
            ThreePointArc((168, -1), (168.7071067812, -0.7071067812), (169, 0))
            Line((169, 0), (168, 0))
            Line((168, 0), (168, -1))
        make_face()
    extrude(amount=F1_DEPTH)


with BuildPart() as f1p:
    # F0 (on Top) → F1, piece 16 (new body)
    with BuildSketch(Plane.XY):
        with BuildLine():
            Line((0, 0), (1, 0))
            ThreePointArc((1, 0), (0.7071067812, 0.7071067812), (0, 1))
            Line((0, 1), (0, 0))
        make_face()
        with BuildLine():
            Line((0, 0), (0, 1))
            ThreePointArc((0, 1), (-0.7071067812, 0.7071067812), (-1, 0))
            Line((-1, 0), (0, 0))
        make_face()
        with BuildLine():
            ThreePointArc((-1, 0), (-0.7071067812, -0.7071067812), (0, -1))
            Line((0, -1), (0, 0))
            Line((0, 0), (-1, 0))
        make_face()
        with BuildLine():
            ThreePointArc((0, -1), (0.7071067812, -0.7071067812), (1, 0))
            Line((1, 0), (0, 0))
            Line((0, 0), (0, -1))
        make_face()
    extrude(amount=F1_DEPTH)


solid = Compound([f1.part, f1b.part, f1c.part, f1d.part, f1e.part, f1f.part, f1g.part, f1h.part, f1i.part, f1j.part, f1k.part, f1l.part, f1m.part, f1n.part, f1o.part, f1p.part])
